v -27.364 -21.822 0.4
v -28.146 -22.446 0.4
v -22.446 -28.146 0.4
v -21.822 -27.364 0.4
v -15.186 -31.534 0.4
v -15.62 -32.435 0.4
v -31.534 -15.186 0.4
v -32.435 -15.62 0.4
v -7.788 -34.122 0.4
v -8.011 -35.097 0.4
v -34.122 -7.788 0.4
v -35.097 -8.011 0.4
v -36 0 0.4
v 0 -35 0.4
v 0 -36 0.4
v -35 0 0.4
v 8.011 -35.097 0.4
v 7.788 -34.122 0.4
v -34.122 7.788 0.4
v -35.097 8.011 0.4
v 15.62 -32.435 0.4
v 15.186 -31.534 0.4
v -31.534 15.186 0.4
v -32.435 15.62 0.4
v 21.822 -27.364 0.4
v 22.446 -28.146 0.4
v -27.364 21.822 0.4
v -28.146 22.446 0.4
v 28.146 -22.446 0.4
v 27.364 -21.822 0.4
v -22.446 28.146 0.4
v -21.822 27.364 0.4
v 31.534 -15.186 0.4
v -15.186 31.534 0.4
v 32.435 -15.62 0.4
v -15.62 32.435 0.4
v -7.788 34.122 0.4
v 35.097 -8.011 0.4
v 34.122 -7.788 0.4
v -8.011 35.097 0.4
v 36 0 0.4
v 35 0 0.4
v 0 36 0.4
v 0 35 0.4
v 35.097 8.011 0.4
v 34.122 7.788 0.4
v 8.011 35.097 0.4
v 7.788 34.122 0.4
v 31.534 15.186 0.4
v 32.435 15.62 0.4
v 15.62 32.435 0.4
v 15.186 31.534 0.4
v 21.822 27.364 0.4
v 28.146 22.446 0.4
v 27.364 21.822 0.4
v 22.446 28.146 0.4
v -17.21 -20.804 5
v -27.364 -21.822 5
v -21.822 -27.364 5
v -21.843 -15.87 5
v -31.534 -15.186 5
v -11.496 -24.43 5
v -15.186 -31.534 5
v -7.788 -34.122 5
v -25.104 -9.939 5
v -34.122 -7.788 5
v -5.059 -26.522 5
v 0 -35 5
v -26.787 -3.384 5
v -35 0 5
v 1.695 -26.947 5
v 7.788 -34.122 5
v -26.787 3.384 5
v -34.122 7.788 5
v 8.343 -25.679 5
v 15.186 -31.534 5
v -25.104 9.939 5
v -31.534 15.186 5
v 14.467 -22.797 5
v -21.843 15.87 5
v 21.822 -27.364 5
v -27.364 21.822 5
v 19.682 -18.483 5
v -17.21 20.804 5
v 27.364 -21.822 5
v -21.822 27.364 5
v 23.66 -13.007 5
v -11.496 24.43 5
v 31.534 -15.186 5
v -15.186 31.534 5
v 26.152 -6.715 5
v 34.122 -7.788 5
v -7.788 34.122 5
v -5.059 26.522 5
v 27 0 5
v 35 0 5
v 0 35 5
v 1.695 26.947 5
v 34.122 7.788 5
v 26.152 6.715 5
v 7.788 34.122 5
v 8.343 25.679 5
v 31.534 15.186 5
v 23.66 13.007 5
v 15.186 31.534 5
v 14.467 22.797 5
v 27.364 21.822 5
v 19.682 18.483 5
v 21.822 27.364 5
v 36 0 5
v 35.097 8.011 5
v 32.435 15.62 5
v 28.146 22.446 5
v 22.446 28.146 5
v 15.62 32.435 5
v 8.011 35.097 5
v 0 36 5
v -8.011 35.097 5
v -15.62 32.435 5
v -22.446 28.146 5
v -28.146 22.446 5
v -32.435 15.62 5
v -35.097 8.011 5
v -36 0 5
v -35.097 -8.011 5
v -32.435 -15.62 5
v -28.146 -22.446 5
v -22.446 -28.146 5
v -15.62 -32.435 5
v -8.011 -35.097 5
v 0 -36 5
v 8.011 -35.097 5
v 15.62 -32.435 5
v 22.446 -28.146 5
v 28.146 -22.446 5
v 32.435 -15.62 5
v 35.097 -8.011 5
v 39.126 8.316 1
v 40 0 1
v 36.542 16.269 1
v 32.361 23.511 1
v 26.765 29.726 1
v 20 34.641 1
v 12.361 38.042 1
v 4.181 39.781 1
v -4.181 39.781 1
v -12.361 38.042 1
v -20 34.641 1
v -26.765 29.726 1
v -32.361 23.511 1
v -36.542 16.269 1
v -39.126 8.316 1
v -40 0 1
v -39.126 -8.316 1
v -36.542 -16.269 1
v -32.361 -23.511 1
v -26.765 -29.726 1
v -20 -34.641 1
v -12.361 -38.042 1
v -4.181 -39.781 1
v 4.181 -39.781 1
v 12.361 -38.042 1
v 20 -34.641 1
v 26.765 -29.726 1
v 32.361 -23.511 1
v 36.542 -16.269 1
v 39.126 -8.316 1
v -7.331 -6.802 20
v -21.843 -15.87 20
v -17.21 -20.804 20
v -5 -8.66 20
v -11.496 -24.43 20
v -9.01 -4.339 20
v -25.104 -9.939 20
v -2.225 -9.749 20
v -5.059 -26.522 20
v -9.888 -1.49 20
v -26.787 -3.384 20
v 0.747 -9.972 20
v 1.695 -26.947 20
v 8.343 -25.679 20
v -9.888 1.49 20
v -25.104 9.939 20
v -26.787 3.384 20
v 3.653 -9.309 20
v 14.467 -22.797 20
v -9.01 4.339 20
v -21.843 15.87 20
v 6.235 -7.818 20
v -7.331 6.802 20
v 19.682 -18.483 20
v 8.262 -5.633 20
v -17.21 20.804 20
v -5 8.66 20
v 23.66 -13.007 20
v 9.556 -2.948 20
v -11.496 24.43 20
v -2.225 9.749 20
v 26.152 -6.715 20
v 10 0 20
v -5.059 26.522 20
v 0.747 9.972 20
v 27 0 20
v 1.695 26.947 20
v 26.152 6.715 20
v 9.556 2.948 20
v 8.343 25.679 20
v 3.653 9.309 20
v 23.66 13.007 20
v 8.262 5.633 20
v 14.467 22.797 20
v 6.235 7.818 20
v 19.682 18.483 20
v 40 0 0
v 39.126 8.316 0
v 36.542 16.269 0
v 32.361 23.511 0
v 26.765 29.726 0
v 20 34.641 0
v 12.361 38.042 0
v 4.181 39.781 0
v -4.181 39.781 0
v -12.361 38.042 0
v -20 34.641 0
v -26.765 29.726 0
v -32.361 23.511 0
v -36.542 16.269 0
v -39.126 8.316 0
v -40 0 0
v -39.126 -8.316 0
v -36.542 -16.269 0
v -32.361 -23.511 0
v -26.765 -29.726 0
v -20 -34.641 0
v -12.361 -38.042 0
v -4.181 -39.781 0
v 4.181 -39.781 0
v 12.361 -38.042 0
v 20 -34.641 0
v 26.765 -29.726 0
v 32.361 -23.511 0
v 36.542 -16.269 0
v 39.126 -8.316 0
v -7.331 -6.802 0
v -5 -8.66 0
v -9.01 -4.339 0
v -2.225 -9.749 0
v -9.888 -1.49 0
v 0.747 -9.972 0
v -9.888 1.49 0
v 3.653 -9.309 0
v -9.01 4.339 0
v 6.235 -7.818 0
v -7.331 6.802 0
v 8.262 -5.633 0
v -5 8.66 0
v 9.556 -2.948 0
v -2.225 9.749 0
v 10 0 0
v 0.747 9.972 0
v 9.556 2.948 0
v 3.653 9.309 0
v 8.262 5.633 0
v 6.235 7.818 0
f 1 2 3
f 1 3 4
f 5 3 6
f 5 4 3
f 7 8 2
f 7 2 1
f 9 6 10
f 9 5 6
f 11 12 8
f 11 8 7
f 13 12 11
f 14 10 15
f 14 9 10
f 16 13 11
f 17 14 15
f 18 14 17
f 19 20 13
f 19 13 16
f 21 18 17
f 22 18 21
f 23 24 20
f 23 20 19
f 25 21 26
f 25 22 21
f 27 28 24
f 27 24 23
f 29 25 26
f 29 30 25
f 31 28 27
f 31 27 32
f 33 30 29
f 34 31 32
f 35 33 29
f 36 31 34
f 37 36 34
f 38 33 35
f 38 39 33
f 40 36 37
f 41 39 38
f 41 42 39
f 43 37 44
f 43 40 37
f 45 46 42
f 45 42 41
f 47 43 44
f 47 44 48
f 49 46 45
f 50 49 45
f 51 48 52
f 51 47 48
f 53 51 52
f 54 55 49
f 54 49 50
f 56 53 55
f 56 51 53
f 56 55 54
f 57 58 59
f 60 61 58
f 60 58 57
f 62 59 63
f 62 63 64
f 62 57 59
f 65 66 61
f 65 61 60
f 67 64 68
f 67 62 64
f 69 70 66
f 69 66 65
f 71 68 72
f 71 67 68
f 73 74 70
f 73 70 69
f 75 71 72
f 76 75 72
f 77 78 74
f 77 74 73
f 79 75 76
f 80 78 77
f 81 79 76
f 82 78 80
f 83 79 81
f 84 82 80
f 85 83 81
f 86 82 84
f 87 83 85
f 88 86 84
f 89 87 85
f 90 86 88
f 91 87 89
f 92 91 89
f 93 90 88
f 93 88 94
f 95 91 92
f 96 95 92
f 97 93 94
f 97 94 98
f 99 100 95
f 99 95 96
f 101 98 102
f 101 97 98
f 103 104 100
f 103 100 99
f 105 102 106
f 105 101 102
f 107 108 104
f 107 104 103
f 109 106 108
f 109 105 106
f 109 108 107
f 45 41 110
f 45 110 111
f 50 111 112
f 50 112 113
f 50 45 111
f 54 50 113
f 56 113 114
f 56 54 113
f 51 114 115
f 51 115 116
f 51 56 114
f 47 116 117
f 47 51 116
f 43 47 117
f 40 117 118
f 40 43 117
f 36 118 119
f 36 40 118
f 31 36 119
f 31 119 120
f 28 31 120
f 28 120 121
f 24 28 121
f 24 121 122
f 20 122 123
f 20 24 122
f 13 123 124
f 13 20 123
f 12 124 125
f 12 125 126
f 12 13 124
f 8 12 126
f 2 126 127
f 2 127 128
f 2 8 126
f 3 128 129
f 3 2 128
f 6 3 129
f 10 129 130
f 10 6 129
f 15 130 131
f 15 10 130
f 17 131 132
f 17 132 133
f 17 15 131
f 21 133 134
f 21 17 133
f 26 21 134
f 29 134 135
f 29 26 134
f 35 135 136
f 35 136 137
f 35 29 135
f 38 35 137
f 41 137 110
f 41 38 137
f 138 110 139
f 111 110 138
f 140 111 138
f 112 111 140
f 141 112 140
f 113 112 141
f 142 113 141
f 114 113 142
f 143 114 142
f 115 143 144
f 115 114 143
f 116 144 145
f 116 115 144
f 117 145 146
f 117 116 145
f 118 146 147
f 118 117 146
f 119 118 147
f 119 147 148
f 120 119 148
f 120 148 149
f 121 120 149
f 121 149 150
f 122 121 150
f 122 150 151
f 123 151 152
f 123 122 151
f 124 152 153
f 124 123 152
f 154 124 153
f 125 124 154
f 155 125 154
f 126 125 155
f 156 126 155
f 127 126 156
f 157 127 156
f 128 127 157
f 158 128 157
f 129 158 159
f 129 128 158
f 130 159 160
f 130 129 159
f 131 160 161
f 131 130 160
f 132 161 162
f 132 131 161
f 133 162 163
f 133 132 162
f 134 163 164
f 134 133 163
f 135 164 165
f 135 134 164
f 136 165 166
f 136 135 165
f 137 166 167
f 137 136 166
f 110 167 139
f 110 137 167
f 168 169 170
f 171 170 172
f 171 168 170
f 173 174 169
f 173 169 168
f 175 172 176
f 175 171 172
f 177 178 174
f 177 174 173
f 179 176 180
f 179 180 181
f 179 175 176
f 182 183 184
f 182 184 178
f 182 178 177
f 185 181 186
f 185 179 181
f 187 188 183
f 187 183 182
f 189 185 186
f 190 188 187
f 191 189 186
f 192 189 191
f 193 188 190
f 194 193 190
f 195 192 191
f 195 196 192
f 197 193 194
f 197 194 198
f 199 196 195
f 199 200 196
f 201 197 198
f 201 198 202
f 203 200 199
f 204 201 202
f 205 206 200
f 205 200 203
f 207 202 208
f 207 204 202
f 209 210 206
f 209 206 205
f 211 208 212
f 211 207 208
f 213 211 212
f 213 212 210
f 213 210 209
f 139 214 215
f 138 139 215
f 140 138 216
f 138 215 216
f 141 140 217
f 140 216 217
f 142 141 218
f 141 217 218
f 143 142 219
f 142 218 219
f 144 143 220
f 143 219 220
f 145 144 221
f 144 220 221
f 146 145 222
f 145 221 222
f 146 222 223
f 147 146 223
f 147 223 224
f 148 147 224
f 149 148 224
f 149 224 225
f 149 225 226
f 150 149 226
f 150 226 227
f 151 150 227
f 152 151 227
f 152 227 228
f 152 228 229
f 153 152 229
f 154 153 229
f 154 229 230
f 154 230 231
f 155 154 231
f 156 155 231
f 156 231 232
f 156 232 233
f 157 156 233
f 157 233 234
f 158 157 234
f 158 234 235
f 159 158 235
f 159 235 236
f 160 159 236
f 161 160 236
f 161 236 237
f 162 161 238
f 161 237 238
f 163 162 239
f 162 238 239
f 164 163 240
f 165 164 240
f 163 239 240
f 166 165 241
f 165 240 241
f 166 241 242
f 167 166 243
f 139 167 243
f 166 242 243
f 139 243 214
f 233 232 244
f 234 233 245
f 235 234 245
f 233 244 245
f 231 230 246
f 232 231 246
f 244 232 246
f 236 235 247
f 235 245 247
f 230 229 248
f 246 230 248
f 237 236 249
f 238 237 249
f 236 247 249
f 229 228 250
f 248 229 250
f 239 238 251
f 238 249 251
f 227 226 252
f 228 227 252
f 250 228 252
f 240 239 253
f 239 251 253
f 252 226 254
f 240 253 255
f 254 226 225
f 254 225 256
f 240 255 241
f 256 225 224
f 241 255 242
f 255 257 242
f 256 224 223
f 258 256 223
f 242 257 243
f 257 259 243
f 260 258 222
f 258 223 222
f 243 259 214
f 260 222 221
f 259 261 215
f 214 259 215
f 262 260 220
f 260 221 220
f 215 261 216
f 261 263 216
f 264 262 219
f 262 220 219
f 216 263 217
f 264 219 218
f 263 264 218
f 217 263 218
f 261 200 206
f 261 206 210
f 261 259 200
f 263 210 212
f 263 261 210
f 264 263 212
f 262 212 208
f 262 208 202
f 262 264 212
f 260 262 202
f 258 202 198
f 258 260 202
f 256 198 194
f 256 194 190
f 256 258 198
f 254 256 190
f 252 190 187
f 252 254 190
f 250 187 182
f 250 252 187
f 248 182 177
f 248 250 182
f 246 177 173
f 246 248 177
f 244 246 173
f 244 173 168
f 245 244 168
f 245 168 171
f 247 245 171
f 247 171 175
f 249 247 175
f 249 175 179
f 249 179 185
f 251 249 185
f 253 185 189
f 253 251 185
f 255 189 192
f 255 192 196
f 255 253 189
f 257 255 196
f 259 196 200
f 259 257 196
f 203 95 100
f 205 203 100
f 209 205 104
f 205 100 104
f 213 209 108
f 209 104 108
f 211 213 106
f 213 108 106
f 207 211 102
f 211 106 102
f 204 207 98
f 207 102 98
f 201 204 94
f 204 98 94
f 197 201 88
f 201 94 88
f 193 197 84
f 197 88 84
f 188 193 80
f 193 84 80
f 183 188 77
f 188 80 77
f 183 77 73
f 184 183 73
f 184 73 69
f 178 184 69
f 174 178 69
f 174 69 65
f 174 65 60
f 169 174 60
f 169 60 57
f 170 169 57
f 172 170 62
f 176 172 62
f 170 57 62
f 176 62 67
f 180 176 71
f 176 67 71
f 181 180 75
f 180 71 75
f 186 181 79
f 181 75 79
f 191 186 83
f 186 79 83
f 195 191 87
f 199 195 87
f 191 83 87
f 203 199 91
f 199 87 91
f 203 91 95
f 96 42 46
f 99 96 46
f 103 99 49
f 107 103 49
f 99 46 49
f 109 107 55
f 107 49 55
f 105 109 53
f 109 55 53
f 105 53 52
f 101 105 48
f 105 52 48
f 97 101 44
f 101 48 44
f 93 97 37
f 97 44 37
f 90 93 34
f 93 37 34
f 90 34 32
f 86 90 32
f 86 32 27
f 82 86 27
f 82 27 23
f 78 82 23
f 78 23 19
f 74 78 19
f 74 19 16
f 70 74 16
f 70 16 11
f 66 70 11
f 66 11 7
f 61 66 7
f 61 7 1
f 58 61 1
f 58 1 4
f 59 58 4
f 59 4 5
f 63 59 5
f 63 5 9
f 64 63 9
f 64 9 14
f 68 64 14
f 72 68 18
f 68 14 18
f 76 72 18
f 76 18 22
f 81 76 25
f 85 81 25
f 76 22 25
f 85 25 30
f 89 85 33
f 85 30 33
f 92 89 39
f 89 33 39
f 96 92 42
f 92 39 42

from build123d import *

# Parameters (mm, degrees)
F0_R     = 35
F0_R_2   = 10
F1_DEPTH = 5
F2_R     = 27
F2_R_2   = 10
F3_DEPTH = 15
F0_R_3   = 40
F4_DEPTH = 0.4
F5_R     = 40
F5_R_2   = 36
F6_DEPTH = 4.6
F7_SIZE  = 3.99999


# Not quite as in the source:
# - a fillet or chamfer is up to 0.001 mm smaller than in the source, because OpenCascade refuses the exact size


with BuildPart() as f1:
    # F0 (on Top) → F1 (new body)
    with BuildSketch(Plane.XY):
        Circle(F0_R)
        Circle(F0_R_2, mode=Mode.SUBTRACT)
    extrude(amount=F1_DEPTH)

    # F2 (on face) → F3 (join)
    with BuildSketch(Plane.XY.offset(5)):
        Circle(F2_R)
        Circle(F2_R_2, mode=Mode.SUBTRACT)
    extrude(amount=F3_DEPTH)

    # F0 (on Top) → F4 (join)
    with BuildSketch(Plane.XY):
        Circle(F0_R_3)
        Circle(F0_R, mode=Mode.SUBTRACT)
    extrude(amount=F4_DEPTH)

    # F5 (on face) → F6 (join)
    with BuildSketch(Plane.XY.offset(0.4)):
        Circle(F5_R)
        Circle(F5_R_2, mode=Mode.SUBTRACT)
    extrude(amount=F6_DEPTH)

    # F7 (size 4 in the source; OpenCascade refuses exactly that, so slightly less here)
    f7_edges = [f1.edges().sort_by_distance(p)[0] for p in [
        (-40, 0, 5),
    ]]
    chamfer(f7_edges, length=F7_SIZE)


solid = f1.part
